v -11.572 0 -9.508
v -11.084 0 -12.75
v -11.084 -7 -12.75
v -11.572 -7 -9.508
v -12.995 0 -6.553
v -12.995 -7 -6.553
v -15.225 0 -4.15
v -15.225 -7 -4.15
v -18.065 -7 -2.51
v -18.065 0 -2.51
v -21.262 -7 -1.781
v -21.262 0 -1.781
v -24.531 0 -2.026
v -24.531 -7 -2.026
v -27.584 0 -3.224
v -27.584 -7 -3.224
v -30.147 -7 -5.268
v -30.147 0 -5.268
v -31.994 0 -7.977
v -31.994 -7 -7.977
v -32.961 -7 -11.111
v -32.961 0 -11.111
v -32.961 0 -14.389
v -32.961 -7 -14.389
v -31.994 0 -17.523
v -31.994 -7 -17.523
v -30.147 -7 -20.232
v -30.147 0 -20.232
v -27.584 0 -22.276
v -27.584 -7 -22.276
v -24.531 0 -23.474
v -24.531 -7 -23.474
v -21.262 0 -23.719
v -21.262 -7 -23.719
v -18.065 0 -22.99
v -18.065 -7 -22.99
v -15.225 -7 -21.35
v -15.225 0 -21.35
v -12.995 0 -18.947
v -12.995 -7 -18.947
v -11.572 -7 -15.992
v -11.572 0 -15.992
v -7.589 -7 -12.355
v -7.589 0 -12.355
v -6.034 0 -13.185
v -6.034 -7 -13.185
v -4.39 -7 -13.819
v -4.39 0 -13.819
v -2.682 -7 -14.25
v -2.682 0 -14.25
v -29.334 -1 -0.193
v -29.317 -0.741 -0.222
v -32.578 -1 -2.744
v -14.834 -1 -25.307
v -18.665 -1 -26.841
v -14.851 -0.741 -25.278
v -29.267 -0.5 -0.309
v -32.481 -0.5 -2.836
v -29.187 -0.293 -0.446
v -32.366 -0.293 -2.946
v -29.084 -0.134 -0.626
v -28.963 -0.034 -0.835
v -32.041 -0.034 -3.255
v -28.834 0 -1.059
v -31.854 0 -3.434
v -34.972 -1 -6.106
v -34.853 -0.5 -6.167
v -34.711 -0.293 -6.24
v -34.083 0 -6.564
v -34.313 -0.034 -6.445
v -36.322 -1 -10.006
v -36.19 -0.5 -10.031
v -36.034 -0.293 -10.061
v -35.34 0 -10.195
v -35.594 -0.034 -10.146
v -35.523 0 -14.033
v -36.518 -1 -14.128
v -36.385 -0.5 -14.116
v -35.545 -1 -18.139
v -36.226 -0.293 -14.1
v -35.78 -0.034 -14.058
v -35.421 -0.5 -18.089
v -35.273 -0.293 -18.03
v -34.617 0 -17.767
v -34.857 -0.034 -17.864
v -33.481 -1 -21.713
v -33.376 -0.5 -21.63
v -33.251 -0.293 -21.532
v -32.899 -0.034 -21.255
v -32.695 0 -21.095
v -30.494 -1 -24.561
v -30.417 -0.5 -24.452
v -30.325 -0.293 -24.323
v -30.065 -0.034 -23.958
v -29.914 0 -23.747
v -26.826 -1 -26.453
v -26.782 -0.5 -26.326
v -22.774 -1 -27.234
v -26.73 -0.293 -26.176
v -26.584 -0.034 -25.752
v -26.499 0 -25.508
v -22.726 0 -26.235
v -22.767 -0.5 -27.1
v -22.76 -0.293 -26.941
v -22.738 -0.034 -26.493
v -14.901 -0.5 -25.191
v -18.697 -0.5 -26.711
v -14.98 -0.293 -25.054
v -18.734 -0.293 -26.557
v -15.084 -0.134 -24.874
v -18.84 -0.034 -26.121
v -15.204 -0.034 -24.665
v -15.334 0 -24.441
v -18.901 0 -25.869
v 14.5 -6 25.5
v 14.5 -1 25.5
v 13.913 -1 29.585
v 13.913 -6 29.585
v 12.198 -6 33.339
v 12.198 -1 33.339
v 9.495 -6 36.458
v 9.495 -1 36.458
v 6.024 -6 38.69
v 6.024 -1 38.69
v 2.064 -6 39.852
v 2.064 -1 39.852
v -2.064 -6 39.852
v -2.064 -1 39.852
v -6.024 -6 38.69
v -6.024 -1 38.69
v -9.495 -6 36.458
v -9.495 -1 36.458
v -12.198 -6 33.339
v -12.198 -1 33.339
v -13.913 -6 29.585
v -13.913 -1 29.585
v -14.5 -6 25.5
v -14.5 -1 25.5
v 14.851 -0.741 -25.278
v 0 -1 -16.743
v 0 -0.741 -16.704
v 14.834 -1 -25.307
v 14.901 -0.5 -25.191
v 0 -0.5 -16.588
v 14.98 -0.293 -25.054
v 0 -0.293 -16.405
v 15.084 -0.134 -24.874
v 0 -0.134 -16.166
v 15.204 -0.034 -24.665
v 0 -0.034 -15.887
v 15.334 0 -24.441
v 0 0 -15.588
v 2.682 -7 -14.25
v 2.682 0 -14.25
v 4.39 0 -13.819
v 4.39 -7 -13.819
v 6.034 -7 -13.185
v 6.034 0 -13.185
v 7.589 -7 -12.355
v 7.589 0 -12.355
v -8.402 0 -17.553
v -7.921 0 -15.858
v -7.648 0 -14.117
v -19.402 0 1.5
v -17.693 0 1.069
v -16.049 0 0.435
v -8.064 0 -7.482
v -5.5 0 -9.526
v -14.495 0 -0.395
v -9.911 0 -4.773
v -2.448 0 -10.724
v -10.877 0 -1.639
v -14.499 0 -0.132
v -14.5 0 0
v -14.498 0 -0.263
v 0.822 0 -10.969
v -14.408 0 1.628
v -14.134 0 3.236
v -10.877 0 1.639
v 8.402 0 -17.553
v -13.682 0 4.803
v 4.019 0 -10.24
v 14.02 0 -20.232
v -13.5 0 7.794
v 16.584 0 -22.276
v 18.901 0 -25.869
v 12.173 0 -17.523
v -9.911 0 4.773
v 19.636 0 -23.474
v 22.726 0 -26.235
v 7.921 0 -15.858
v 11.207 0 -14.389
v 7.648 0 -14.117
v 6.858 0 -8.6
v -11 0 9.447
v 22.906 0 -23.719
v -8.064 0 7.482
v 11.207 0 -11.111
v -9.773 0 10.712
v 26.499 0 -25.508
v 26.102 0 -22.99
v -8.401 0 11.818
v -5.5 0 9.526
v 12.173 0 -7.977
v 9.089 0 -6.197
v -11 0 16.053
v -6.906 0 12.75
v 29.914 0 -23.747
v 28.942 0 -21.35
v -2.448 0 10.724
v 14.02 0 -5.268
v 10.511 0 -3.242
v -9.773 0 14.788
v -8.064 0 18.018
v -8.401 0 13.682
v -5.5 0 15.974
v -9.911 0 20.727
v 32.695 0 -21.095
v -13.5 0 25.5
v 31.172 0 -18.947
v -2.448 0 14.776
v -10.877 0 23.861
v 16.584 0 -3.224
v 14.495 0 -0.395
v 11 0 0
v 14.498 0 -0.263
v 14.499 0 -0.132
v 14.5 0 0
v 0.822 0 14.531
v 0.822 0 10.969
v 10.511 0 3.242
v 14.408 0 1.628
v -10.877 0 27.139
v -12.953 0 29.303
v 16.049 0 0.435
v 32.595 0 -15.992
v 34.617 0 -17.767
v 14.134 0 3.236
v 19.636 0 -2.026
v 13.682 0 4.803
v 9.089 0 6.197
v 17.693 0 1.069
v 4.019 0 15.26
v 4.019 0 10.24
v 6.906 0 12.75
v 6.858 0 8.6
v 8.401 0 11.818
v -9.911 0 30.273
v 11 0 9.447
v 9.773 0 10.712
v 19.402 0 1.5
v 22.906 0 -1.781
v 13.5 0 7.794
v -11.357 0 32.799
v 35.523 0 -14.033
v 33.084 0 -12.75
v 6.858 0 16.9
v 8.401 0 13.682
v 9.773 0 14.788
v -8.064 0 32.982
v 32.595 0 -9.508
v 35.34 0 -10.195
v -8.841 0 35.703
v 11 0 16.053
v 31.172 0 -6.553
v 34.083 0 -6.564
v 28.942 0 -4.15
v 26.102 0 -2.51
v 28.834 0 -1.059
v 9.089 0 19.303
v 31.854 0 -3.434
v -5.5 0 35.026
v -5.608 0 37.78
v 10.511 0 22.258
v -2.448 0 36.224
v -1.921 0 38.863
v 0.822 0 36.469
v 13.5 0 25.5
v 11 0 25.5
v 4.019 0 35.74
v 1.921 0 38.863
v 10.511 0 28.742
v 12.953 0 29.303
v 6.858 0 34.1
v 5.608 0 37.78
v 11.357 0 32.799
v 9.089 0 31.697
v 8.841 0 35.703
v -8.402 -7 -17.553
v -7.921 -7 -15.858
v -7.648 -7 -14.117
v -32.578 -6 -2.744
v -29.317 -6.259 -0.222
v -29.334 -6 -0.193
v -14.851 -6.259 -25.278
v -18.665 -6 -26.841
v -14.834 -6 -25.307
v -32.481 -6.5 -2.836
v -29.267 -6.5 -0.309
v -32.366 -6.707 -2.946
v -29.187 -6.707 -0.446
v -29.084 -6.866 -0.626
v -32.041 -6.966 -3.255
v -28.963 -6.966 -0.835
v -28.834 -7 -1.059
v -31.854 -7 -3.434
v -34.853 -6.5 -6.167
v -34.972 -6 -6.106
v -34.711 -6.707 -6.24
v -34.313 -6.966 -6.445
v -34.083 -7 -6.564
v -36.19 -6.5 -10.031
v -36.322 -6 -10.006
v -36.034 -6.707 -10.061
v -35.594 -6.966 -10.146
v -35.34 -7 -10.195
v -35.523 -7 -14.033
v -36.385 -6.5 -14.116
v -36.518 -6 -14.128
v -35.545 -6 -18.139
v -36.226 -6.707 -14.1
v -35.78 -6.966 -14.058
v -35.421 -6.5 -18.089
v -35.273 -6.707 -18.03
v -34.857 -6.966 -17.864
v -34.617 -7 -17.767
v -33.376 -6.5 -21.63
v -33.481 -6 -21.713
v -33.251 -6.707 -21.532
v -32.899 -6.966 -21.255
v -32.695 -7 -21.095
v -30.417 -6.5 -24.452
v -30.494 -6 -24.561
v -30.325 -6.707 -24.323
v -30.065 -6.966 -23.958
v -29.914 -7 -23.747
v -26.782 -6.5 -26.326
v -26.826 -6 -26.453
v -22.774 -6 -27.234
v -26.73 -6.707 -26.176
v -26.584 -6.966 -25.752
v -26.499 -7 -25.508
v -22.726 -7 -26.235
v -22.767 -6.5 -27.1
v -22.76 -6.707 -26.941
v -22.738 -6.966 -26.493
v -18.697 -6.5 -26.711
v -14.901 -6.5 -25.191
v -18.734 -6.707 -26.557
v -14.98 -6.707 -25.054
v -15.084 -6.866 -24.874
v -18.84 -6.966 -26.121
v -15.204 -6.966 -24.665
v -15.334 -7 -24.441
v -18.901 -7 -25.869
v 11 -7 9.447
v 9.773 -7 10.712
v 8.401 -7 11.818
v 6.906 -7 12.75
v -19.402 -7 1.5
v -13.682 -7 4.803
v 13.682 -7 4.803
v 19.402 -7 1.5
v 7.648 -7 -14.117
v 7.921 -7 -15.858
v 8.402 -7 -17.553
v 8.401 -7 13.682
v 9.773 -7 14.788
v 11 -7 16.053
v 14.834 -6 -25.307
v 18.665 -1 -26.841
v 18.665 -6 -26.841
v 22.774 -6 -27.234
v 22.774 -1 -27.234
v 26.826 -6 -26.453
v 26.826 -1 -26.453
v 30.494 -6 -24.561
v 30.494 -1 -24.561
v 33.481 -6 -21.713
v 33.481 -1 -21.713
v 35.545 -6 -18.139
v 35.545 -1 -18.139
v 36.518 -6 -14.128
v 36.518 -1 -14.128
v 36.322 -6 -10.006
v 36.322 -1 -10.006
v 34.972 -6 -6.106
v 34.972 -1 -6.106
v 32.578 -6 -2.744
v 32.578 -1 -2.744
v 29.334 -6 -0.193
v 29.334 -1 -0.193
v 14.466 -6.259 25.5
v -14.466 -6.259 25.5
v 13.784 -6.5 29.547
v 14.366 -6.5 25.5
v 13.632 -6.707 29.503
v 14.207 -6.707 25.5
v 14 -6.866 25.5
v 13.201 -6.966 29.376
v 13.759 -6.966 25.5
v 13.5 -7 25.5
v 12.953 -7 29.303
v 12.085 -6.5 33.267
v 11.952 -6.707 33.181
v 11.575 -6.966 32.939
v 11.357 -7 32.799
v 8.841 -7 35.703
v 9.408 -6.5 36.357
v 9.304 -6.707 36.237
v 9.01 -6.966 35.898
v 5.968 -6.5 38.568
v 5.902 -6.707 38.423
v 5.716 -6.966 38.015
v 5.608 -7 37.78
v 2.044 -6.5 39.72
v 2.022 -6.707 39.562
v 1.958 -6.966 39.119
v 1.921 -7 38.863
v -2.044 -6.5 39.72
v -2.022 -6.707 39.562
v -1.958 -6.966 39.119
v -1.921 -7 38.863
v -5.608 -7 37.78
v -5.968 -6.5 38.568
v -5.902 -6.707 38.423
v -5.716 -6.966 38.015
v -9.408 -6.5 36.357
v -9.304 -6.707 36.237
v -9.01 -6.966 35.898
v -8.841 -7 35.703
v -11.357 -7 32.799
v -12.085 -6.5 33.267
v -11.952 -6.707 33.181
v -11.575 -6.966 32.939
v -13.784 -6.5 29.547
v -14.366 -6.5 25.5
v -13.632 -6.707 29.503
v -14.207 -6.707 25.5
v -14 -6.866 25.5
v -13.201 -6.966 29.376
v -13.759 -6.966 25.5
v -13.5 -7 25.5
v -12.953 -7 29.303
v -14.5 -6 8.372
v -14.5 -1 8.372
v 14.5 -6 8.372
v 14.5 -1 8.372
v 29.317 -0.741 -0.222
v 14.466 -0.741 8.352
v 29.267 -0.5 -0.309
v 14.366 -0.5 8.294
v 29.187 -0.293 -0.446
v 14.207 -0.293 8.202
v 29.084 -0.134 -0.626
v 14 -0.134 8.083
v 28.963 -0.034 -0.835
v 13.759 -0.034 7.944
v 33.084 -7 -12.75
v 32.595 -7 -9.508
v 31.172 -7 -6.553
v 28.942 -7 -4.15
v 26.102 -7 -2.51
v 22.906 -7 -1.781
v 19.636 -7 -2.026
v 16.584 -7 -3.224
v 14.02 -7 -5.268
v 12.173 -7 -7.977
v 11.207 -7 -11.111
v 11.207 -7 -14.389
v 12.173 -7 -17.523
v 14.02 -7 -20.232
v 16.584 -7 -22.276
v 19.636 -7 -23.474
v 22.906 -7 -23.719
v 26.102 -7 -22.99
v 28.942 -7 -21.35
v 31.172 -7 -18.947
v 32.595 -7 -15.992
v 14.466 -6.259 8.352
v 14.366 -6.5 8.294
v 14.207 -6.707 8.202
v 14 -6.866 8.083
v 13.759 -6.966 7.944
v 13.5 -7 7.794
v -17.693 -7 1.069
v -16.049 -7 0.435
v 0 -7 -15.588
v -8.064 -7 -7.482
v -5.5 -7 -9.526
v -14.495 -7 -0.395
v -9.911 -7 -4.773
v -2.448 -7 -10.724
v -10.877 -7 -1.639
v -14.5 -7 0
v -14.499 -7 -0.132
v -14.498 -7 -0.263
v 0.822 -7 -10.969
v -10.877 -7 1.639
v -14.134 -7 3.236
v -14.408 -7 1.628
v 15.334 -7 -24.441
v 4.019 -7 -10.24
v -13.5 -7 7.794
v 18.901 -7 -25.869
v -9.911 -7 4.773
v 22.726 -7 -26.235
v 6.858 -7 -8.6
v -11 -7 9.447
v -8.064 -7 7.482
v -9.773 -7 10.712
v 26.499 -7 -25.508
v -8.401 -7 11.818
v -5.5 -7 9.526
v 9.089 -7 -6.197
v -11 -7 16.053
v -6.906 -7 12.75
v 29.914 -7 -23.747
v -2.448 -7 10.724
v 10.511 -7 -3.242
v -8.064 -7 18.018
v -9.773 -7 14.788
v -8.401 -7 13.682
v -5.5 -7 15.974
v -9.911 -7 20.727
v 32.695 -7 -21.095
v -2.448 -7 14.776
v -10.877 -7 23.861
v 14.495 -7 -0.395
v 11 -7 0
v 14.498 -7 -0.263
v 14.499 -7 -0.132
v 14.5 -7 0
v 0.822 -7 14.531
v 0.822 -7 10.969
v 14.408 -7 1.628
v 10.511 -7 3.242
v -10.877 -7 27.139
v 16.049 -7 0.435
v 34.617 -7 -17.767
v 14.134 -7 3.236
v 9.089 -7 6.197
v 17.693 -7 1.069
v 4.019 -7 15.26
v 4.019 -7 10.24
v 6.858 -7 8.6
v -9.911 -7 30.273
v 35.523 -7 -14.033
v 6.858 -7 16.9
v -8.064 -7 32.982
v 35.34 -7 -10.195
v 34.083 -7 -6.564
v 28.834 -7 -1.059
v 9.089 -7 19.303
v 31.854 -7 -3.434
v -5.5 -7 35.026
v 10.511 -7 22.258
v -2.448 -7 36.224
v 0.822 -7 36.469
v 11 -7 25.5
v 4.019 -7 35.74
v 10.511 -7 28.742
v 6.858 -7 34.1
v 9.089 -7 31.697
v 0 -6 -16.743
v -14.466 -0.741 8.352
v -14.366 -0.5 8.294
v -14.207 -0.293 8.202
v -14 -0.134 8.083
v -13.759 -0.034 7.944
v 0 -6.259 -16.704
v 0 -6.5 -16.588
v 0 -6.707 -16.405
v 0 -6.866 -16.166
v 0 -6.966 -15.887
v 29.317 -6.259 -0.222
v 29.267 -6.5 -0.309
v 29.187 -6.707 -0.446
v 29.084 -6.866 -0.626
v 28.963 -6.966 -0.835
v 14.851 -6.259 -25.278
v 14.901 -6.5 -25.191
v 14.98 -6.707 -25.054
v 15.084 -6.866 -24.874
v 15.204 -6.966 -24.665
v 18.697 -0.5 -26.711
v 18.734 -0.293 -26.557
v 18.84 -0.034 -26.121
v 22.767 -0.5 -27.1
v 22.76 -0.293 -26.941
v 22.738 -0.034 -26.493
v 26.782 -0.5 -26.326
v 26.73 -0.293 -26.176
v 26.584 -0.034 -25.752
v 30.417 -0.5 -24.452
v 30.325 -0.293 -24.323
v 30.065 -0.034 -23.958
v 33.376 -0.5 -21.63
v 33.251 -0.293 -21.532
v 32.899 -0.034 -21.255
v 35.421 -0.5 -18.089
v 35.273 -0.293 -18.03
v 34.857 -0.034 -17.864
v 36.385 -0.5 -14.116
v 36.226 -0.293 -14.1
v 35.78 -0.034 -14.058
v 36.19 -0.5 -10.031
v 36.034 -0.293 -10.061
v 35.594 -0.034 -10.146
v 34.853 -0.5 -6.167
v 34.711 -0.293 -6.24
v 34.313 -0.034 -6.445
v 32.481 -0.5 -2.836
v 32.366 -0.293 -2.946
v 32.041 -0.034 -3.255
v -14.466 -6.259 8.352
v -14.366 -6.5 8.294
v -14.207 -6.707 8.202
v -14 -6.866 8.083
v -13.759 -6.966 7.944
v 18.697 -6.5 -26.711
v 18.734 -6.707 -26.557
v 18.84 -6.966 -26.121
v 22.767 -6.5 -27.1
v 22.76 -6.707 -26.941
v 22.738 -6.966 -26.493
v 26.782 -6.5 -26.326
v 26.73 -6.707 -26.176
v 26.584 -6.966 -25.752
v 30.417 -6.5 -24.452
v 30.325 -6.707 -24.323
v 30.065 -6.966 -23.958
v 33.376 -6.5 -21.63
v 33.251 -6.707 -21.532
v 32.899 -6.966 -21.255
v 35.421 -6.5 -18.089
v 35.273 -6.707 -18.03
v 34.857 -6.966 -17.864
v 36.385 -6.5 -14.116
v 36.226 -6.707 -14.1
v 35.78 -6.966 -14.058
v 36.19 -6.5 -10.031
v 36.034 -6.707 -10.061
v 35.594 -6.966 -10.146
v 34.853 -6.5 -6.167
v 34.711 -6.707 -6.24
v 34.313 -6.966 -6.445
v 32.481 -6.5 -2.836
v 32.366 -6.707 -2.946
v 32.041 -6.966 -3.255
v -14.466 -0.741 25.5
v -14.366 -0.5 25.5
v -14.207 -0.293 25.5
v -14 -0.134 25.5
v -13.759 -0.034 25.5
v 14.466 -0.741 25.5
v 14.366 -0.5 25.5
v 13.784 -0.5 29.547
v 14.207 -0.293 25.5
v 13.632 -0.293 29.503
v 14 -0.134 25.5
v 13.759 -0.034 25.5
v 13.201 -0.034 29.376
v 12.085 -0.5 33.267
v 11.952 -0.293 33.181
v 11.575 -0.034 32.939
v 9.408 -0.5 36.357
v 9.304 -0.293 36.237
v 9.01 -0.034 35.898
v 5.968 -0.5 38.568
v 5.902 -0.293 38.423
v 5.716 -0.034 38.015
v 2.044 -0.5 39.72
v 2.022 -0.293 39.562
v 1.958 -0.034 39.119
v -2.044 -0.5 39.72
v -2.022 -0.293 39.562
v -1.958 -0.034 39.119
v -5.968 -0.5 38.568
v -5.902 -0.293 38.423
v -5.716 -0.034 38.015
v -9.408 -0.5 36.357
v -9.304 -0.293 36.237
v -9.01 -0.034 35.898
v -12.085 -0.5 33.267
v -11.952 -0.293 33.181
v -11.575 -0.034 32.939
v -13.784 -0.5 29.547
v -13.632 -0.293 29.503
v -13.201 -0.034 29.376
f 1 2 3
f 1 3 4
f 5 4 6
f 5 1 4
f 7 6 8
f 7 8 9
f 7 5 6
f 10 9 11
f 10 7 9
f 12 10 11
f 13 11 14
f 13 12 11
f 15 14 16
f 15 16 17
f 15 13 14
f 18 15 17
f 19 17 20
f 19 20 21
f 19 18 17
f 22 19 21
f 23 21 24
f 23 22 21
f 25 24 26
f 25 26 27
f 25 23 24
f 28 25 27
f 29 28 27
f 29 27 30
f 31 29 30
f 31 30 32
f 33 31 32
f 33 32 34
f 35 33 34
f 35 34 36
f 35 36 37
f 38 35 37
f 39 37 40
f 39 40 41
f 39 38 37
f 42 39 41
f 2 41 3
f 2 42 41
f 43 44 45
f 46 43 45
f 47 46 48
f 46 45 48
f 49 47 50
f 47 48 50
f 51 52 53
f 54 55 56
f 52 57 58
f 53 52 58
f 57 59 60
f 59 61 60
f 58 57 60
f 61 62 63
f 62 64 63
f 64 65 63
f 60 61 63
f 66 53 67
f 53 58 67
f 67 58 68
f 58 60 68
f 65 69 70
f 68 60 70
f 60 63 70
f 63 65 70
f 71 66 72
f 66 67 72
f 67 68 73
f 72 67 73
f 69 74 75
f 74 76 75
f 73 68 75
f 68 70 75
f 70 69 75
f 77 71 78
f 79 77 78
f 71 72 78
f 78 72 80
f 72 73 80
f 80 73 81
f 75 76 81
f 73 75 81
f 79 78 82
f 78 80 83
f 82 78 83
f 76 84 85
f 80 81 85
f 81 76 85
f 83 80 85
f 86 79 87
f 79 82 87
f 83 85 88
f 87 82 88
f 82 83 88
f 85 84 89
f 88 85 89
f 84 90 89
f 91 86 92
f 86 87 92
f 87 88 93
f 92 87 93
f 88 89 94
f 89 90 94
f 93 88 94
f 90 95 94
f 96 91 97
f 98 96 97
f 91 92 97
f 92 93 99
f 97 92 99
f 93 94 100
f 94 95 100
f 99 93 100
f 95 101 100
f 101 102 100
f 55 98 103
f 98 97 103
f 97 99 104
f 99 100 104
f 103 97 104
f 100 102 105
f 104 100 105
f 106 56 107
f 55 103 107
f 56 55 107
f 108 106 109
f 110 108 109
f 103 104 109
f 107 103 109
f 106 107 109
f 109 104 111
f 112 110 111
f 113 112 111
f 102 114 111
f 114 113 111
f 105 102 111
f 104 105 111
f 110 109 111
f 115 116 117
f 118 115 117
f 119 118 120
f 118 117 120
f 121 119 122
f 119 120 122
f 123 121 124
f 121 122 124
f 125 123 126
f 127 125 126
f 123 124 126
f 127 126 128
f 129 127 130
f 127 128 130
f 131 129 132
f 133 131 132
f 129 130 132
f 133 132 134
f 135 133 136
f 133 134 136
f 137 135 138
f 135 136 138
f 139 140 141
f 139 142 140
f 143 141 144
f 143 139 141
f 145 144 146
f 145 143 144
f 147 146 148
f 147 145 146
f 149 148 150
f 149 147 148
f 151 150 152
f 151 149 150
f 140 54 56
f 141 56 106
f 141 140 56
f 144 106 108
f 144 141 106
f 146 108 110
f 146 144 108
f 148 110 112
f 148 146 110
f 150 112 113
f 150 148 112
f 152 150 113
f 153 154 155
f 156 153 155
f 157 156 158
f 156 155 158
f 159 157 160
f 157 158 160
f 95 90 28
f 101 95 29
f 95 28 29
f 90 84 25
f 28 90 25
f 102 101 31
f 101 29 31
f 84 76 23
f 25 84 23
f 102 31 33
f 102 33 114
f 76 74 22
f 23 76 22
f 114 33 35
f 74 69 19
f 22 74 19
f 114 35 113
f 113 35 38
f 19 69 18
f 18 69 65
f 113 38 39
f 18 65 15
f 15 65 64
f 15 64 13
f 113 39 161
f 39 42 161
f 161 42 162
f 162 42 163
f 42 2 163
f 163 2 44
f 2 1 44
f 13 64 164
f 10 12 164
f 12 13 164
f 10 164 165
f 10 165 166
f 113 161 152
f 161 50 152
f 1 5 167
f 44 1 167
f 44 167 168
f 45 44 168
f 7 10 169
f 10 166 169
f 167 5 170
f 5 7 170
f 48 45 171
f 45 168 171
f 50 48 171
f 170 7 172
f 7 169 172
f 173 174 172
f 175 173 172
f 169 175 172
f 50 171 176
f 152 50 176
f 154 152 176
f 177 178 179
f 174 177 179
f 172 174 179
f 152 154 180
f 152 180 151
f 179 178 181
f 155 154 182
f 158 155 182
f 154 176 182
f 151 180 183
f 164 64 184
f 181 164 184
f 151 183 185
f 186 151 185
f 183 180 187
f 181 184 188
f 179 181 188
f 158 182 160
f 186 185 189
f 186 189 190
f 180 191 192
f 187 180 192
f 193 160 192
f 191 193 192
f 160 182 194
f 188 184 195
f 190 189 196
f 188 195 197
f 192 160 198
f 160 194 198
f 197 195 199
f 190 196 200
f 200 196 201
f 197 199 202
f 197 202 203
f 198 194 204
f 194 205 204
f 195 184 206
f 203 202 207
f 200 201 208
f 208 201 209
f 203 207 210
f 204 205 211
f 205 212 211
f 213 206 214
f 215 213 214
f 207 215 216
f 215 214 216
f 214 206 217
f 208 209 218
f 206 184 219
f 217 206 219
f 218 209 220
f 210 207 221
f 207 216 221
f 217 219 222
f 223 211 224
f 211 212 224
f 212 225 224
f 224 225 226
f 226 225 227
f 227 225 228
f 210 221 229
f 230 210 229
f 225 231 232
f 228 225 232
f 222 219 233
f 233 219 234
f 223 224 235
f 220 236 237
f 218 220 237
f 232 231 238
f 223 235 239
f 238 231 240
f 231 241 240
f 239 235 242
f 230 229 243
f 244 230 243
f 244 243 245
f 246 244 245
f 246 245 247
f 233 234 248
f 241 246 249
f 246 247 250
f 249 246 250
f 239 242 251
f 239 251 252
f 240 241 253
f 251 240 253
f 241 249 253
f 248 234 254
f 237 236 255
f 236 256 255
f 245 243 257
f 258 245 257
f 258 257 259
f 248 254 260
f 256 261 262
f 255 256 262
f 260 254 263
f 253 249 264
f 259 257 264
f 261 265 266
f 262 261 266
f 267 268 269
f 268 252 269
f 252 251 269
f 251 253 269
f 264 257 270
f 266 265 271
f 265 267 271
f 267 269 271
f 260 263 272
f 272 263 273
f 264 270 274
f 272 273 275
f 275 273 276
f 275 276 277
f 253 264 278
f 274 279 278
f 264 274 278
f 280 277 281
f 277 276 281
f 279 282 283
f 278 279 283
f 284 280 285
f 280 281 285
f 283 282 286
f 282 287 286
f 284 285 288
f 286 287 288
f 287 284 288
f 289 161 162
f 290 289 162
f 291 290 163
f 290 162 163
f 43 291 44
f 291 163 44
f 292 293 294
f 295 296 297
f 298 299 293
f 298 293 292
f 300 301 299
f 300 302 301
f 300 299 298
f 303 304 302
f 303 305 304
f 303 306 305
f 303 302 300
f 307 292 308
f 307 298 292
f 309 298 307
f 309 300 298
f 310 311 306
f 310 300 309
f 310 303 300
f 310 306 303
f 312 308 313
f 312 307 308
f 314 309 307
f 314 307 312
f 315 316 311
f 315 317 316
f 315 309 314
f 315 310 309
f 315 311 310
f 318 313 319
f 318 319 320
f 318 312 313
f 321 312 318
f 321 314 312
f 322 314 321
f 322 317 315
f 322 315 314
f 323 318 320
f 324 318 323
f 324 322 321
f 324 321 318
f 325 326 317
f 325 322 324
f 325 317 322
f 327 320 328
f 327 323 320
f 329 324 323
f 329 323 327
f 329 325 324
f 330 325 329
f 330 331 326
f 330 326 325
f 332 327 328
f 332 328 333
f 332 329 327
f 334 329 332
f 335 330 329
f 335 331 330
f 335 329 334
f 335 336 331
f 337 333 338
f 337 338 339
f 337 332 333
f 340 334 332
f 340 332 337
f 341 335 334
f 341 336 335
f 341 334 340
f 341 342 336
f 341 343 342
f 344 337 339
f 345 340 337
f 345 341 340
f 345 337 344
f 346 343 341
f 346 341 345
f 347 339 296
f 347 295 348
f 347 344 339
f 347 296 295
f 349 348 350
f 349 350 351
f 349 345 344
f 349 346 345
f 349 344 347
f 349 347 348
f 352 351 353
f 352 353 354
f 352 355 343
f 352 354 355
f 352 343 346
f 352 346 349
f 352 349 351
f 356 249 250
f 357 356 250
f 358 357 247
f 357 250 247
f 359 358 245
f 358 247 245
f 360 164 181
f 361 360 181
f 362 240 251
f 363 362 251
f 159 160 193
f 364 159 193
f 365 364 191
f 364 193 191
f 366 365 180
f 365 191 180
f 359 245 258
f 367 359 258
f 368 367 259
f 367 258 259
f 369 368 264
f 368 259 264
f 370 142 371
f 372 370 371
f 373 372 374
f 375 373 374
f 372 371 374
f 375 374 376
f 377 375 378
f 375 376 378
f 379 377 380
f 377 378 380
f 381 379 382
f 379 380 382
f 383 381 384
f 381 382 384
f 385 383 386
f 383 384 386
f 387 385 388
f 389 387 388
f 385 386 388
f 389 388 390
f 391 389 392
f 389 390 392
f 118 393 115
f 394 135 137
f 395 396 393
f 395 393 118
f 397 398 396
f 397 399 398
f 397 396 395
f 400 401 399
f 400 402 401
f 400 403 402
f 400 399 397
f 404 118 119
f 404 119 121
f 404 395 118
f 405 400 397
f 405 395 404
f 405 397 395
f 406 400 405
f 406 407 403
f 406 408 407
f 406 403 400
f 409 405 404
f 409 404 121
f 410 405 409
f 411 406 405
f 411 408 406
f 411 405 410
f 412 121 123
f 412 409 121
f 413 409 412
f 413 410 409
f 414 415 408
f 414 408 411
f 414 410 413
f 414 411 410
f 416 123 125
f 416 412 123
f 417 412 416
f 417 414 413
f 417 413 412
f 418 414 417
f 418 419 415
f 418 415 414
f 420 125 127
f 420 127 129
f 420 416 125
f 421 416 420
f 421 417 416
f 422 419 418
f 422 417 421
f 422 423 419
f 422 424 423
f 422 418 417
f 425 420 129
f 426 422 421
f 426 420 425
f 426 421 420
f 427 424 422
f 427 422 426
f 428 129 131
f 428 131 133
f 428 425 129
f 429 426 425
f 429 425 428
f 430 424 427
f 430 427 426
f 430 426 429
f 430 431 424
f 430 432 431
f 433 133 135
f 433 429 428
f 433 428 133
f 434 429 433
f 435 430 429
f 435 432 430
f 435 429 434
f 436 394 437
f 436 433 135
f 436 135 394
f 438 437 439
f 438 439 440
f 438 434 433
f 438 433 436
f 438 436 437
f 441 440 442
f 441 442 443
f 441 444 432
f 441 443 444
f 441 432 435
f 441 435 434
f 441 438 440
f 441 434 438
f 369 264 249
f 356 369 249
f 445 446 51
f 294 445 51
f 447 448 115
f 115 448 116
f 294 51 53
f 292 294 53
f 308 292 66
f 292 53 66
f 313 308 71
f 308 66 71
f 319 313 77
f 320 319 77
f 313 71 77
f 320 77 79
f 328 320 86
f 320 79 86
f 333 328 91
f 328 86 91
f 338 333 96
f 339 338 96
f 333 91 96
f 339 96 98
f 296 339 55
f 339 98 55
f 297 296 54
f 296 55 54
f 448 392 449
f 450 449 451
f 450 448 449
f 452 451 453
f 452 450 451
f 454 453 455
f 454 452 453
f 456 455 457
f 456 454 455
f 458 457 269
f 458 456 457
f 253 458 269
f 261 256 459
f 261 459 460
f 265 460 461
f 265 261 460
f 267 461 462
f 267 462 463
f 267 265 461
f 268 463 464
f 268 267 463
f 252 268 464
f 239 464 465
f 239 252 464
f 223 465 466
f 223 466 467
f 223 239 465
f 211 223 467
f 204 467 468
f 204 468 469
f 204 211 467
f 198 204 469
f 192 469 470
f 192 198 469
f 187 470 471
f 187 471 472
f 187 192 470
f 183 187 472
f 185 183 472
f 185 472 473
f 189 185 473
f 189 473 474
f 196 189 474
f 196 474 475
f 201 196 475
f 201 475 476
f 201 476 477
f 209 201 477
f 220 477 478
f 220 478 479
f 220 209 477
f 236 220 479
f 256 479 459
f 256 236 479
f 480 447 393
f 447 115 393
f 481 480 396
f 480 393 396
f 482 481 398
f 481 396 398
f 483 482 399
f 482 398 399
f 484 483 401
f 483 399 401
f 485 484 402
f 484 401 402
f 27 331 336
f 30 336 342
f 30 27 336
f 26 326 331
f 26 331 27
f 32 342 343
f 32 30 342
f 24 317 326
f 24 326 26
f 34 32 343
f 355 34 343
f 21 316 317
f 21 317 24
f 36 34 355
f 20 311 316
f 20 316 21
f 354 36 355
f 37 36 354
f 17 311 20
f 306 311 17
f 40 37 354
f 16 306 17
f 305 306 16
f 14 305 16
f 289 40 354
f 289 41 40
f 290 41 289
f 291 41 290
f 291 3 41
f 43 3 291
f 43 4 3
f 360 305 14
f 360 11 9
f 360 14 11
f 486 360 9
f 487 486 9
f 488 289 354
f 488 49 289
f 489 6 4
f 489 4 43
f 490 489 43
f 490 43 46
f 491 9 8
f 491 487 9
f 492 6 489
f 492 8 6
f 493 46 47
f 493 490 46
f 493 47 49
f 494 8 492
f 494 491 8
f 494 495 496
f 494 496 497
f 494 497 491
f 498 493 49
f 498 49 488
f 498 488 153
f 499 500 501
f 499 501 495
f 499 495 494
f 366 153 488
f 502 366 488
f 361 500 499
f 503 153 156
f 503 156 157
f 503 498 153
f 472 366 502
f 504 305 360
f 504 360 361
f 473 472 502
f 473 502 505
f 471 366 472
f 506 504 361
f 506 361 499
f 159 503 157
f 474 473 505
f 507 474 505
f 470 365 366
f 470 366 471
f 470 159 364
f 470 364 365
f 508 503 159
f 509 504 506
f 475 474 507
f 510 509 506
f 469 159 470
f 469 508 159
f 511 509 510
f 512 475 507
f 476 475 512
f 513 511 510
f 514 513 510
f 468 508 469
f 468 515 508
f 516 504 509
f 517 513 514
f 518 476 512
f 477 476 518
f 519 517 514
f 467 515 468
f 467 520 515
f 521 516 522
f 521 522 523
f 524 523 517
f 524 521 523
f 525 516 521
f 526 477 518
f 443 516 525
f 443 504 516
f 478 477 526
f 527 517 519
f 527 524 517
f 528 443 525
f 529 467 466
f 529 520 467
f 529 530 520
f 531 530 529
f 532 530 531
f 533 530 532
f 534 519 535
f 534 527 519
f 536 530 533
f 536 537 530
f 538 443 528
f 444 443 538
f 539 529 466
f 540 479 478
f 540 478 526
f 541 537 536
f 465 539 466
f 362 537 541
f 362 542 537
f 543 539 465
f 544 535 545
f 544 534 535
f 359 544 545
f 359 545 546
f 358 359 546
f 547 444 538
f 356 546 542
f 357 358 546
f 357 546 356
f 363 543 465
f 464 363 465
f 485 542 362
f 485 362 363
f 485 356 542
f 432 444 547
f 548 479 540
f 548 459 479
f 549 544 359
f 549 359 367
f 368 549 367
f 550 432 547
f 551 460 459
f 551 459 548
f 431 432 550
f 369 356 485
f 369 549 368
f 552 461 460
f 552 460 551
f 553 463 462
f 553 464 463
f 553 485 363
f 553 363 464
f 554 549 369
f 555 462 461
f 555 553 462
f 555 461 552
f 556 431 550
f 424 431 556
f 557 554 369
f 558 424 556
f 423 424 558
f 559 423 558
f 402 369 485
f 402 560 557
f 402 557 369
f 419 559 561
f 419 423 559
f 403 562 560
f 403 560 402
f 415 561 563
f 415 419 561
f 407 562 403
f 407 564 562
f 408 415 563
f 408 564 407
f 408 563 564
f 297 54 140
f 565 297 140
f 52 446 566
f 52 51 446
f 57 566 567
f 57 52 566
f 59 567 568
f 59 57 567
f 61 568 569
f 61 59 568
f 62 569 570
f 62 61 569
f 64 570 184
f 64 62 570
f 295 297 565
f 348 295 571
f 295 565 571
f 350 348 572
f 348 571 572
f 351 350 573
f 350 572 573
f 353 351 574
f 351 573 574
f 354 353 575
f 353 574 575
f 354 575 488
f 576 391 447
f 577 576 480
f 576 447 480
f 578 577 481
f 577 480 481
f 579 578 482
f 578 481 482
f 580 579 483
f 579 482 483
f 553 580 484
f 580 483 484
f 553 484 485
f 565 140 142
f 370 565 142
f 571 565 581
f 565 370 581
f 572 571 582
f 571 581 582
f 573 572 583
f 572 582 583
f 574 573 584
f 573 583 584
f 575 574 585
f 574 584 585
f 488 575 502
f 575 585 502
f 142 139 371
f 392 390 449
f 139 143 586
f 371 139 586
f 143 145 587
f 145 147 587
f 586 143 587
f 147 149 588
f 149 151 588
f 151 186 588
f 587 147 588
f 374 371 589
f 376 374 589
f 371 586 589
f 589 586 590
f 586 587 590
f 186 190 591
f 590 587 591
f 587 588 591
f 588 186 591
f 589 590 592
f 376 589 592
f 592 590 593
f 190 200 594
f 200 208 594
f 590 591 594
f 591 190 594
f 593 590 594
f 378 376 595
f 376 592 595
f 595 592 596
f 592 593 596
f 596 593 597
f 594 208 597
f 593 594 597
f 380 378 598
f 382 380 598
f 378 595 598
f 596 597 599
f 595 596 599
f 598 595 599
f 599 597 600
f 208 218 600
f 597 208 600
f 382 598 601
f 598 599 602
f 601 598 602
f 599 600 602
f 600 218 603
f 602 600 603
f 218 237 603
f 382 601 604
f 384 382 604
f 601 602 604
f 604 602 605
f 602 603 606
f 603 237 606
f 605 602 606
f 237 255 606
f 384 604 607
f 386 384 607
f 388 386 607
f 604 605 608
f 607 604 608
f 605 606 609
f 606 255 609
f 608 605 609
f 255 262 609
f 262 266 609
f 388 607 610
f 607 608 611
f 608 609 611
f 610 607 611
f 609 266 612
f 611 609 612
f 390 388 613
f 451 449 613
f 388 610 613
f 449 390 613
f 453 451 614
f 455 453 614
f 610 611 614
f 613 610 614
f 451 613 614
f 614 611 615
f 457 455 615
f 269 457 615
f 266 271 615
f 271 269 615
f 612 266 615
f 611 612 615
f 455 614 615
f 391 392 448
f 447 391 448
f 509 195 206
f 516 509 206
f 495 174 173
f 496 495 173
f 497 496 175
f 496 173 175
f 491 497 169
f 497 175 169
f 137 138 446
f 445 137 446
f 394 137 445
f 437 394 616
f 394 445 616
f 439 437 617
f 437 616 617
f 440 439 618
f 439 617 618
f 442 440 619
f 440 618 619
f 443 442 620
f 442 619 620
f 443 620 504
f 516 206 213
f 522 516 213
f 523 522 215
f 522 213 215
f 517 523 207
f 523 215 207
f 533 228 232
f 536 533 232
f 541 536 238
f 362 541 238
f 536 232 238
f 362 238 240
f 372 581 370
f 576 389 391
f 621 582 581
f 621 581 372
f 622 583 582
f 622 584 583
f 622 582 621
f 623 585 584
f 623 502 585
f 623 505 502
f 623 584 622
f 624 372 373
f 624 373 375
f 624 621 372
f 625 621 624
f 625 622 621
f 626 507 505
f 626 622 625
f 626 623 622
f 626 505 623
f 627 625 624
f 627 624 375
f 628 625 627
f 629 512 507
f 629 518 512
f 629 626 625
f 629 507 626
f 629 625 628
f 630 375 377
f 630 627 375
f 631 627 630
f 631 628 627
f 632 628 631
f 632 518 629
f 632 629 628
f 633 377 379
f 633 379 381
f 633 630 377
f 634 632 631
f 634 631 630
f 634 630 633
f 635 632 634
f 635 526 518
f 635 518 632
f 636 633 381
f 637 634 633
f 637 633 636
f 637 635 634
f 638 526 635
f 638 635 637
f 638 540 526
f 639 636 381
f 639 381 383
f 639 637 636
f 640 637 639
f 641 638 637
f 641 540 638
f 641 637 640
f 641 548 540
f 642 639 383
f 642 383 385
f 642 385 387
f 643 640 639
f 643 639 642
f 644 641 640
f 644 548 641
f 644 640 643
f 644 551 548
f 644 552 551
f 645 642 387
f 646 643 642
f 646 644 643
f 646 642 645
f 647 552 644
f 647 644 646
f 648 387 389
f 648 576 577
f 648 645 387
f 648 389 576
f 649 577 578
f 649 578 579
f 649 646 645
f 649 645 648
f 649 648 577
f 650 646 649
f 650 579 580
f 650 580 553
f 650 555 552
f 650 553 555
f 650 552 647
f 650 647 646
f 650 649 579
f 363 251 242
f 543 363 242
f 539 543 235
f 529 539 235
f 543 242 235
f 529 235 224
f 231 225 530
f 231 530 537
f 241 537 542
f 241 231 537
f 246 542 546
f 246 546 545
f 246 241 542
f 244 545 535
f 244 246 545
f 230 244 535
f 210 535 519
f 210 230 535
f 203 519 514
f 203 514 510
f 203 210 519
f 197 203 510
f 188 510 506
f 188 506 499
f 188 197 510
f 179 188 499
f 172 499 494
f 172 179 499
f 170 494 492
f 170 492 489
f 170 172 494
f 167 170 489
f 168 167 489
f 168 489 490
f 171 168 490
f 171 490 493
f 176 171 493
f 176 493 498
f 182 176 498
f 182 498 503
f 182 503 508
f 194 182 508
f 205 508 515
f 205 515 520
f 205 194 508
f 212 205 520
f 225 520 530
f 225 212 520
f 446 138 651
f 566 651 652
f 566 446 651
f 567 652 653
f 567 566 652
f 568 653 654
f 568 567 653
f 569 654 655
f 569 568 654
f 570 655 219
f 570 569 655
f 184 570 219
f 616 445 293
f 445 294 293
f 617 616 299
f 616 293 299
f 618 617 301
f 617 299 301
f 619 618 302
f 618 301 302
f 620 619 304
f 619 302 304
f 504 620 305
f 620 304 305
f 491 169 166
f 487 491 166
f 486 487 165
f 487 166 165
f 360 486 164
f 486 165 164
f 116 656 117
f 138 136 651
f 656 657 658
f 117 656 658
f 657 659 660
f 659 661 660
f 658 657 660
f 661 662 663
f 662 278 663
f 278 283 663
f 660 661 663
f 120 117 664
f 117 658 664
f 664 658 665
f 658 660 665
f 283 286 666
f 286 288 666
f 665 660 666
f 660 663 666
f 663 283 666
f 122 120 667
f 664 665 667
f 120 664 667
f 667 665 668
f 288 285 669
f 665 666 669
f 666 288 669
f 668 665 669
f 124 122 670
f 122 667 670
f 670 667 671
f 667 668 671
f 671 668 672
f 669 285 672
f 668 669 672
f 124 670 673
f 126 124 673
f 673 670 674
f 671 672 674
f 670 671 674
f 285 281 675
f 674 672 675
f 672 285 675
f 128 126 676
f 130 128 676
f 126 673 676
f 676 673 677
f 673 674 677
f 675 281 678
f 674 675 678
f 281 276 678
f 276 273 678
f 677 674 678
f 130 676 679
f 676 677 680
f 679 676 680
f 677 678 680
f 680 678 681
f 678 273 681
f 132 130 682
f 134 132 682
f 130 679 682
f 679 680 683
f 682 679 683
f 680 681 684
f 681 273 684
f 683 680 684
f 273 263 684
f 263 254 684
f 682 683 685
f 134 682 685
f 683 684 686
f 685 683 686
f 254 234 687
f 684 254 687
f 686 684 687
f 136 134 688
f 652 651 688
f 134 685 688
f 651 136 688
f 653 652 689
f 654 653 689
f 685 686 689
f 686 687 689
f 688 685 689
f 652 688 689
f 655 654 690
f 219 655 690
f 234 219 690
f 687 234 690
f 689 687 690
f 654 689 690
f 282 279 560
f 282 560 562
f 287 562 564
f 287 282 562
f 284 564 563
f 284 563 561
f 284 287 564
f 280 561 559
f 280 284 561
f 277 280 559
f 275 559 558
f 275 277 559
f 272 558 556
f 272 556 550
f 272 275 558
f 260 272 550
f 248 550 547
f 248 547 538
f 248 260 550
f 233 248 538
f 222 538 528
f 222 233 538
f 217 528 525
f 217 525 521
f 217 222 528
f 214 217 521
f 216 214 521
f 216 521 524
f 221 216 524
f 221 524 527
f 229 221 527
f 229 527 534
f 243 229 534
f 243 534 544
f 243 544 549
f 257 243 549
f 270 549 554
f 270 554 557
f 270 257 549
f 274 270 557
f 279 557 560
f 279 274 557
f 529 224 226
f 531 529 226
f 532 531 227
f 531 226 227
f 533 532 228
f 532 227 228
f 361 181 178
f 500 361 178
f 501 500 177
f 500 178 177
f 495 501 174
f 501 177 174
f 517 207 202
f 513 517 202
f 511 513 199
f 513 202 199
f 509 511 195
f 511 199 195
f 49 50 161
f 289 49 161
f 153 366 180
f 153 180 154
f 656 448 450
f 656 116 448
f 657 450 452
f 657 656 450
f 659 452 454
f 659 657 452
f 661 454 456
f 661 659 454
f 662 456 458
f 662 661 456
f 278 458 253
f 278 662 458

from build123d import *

# Parameters (mm, degrees)
F0_R     = 11
F1_DEPTH = 7
F2_R     = 1


# Not quite as in the source:
# - a feature names something its author has since deleted; it is built from what else it names


with BuildPart() as f1:
    # F0 (on Front) → F1 (new body)
    with BuildSketch(Plane.XZ):
        with BuildLine():
            ThreePointArc((14.5, 25.5), (0, 40), (-14.5, 25.5))
            Line((-14.5, 25.5), (-14.5, 8.3715789032))
            Line((-14.5, 8.3715789032), (-29.3336477965, -0.1926316451))
            ThreePointArc((-29.3336477965, -0.1926316451), (-34.6410161514, -20), (-14.8336477965, -25.3073683549))
            Line((-14.8336477965, -25.3073683549), (0, -16.7431578065))
            Line((0, -16.7431578065), (14.8336477965, -25.3073683549))
            ThreePointArc((14.8336477965, -25.3073683549), (34.6410161514, -20), (29.3336477965, -0.1926316451))
            Line((29.3336477965, -0.1926316451), (14.5, 8.3715789032))
            Line((14.5, 8.3715789032), (14.5, 25.5))
        make_face()
        with Locations((-22.0836477965, -12.75)):
            Circle(F0_R, mode=Mode.SUBTRACT)
        with BuildLine():
            ThreePointArc((-8.4021137105, -17.5526685347), (-7.7579062737, -14.9912339956), (-7.589017069, -12.355436857))
            ThreePointArc((-7.589017069, -12.355436857), (-5.2219051854, -13.5270730846), (-2.681534086, -14.2498903486))
            Line((-2.681534086, -14.2498903486), (-8.4021137105, -17.5526685347))
        make_face(mode=Mode.SUBTRACT)
        with BuildLine():
            ThreePointArc((-13.681534086, 4.8026685347), (-14.293919061, 2.4359552288), (-14.5, 0))
            ThreePointArc((-14.5, 0), (-14.4986576197, -0.1972998371), (-14.4946307275, -0.394563143))
            ThreePointArc((-14.4946307275, -0.394563143), (-16.8617426112, 0.7770730846), (-19.4021137105, 1.4998903486))
            Line((-19.4021137105, 1.4998903486), (-13.681534086, 4.8026685347))
        make_face(mode=Mode.SUBTRACT)
        with BuildLine():
            Line((8.4021137105, -17.5526685347), (2.681534086, -14.2498903486))
            ThreePointArc((2.681534086, -14.2498903486), (5.2219051854, -13.5270730846), (7.589017069, -12.355436857))
            ThreePointArc((7.589017069, -12.355436857), (7.7579062737, -14.9912339956), (8.4021137105, -17.5526685347))
        make_face(mode=Mode.SUBTRACT)
        with Locations((22.0836477965, -12.75)):
            Circle(F0_R, mode=Mode.SUBTRACT)
        Circle(F0_R, mode=Mode.SUBTRACT)
        with BuildLine():
            ThreePointArc((19.4021137105, 1.4998903486), (16.8617426112, 0.7770730846), (14.4946307275, -0.394563143))
            ThreePointArc((14.4946307275, -0.394563143), (14.4986576197, -0.1972998371), (14.5, 0))
            ThreePointArc((14.5, 0), (14.293919061, 2.4359552288), (13.681534086, 4.8026685347))
            Line((13.681534086, 4.8026685347), (19.4021137105, 1.4998903486))
        make_face(mode=Mode.SUBTRACT)
        with BuildLine():
            Line((-11, 9.4472218138), (-11, 16.0527781862))
            ThreePointArc((-11, 16.0527781862), (-9.1038363374, 14.214160911), (-6.9056136585, 12.75))
            ThreePointArc((-6.9056136585, 12.75), (-9.1038363374, 11.285839089), (-11, 9.4472218138))
        make_face(mode=Mode.SUBTRACT)
        with BuildLine():
            ThreePointArc((6.9056136585, 12.75), (9.1038363374, 14.214160911), (11, 16.0527781862))
            Line((11, 16.0527781862), (11, 9.4472218138))
            ThreePointArc((11, 9.4472218138), (9.1038363374, 11.285839089), (6.9056136585, 12.75))
        make_face(mode=Mode.SUBTRACT)
        with Locations((0, 25.5)):
            Circle(F0_R, mode=Mode.SUBTRACT)
    extrude(amount=F1_DEPTH)

    # F2
    f2_edges = [f1.edges().sort_by_distance(p)[0] for p in [
        (21.916824, -7, 4.089474),
        (14.5, -7, 16.935789),
        (14.5, 0, 16.935789),
        (21.916824, 0, 4.089474),
        (-7.416824, -7, -21.025263),
        (-21.916824, 0, 4.089474),
    ]]
    fillet(f2_edges, radius=F2_R)


solid = f1.part
